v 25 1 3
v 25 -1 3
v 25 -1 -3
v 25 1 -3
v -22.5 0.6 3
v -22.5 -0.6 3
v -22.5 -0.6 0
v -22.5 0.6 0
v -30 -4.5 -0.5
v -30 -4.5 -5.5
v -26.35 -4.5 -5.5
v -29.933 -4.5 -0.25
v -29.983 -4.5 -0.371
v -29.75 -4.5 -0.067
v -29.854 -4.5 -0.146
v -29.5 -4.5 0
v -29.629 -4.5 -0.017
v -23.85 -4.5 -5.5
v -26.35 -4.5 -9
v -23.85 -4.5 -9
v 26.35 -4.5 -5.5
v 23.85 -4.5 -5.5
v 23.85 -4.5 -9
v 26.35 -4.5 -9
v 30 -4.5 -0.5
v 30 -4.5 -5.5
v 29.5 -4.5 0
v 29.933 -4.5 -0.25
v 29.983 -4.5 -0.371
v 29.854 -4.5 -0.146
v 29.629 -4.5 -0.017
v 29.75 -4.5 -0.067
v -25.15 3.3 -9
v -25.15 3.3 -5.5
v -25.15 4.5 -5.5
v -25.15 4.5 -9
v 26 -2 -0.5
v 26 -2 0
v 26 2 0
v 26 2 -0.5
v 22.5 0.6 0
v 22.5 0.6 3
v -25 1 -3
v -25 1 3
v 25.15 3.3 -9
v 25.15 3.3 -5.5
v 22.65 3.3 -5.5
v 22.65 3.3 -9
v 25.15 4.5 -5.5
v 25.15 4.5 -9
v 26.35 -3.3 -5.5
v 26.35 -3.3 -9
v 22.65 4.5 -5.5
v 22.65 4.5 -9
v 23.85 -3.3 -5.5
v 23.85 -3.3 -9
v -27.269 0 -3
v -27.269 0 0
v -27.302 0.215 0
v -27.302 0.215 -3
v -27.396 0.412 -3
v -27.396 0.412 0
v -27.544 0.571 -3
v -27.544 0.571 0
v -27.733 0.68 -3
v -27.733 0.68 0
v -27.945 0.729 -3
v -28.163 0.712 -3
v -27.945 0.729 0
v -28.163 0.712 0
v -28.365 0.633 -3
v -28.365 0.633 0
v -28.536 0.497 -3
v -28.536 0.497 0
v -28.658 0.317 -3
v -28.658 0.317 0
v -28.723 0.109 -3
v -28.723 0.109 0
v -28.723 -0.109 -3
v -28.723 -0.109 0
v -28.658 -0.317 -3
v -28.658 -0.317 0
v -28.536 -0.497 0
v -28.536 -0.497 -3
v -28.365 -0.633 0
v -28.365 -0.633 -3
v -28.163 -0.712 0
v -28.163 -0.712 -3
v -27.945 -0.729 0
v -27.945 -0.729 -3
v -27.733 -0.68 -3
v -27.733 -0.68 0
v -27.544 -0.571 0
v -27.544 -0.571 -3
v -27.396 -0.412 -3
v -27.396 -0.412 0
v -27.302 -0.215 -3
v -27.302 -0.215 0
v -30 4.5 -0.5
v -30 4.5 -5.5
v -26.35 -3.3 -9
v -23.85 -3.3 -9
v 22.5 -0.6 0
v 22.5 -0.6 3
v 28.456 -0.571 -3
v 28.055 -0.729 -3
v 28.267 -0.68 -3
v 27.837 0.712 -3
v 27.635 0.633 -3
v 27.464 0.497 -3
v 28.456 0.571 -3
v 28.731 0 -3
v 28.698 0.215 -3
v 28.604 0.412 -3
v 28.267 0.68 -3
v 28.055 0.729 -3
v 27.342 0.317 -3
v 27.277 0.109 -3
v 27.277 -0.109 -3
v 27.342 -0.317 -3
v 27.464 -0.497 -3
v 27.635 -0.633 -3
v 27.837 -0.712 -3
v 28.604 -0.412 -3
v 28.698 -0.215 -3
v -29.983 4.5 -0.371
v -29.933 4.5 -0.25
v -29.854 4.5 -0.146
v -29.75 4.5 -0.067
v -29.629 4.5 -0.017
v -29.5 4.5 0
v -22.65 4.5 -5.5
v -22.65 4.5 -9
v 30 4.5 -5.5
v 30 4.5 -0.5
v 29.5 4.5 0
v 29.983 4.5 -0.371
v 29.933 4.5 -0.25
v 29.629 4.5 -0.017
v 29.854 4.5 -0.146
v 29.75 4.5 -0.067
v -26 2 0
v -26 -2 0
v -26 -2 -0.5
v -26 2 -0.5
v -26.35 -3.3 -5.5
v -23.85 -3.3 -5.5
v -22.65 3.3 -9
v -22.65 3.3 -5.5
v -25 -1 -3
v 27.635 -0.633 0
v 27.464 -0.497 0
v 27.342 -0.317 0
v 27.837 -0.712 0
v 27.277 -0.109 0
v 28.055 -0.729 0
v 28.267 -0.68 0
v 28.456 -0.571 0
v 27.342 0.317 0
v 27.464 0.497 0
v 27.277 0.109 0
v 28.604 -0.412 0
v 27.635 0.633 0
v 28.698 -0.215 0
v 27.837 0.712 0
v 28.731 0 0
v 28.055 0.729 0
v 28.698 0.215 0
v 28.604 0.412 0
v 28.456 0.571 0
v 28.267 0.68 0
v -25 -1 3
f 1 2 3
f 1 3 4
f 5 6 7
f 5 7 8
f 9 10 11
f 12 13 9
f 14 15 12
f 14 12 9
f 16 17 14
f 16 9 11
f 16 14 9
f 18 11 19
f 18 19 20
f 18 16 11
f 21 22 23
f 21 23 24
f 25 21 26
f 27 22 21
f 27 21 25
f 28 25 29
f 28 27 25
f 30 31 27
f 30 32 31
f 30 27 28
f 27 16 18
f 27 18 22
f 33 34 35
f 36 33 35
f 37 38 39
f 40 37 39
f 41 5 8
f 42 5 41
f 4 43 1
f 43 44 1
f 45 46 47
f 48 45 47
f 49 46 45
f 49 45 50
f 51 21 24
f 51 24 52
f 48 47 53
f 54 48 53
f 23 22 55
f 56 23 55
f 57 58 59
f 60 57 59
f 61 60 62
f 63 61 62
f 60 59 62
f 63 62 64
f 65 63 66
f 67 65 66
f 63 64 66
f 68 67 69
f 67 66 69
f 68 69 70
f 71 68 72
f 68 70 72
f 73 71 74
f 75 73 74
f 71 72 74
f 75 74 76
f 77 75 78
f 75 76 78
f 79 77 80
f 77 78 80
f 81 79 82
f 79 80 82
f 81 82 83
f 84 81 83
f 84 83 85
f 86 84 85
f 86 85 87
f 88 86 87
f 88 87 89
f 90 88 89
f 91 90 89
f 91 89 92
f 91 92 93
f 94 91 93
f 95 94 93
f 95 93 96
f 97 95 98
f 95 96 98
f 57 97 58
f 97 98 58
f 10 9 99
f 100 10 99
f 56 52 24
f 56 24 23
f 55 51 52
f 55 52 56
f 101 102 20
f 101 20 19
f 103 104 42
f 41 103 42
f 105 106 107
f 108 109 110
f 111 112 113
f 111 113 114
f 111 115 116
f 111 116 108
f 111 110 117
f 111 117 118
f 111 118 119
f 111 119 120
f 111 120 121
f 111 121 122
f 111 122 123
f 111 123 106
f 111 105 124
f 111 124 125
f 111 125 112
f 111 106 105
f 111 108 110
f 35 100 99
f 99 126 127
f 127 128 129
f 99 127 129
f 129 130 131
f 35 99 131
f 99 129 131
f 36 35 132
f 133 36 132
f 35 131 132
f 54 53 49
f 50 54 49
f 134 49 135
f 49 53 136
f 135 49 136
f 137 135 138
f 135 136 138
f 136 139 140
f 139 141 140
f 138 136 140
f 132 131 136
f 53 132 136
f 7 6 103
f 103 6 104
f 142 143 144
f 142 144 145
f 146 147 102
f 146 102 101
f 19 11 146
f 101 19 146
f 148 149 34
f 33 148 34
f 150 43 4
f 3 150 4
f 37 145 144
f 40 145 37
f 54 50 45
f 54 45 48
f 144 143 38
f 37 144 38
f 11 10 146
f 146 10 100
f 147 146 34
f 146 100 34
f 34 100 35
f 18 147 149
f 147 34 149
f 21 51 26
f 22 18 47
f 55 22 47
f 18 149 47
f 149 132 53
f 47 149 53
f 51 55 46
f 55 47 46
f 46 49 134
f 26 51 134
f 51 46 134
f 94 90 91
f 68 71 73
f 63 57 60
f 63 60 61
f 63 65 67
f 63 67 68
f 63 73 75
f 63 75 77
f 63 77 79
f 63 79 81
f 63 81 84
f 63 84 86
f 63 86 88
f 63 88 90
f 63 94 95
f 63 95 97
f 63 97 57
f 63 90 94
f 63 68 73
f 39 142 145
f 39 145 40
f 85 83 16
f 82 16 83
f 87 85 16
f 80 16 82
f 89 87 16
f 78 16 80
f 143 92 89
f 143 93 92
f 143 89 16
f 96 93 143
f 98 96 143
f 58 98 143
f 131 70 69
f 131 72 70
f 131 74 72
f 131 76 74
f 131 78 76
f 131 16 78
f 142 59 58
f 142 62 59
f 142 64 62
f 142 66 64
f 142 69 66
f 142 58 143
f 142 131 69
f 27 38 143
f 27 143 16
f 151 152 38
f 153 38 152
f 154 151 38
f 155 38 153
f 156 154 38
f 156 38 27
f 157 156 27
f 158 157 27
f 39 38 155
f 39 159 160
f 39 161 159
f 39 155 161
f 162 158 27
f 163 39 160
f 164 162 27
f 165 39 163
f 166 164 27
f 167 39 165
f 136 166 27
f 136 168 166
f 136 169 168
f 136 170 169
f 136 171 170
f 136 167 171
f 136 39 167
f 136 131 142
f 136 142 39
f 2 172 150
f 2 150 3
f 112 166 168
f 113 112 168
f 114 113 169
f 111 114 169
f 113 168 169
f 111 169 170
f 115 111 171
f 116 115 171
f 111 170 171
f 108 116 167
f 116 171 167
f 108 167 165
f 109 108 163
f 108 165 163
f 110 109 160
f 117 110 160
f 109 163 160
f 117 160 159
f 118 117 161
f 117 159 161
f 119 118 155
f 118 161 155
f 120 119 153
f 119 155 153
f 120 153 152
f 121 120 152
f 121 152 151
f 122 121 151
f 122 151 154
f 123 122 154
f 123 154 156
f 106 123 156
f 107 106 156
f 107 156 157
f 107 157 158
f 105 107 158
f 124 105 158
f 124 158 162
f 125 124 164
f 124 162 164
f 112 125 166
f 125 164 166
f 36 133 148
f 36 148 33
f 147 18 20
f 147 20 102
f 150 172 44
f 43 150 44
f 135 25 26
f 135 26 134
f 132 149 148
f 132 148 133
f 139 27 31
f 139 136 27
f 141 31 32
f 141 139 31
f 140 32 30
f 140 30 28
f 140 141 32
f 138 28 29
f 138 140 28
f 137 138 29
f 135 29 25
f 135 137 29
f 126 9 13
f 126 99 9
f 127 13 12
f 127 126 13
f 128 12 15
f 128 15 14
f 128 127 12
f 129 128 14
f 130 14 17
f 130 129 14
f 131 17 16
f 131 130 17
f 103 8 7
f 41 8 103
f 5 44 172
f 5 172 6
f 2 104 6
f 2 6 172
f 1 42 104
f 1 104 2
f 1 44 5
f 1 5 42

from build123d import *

# Parameters (mm, degrees)
SKIZZE1_W                       = 60
SKIZZE1_H                       = 9
BODY_DEPTH                      = 5.5
SKIZZE4_R                       = 0.730693515
SCREW_HOLES_DEPTH               = 3
SKIZZE5_W                       = 52
SKIZZE5_H                       = 4
SCHNITT_LINEAR_AUSTRAGEN3_DEPTH = 0.5
VERRUNDUNG1_R                   = 0.5
PATHWAY_OF_GLIDER_W             = 50
PATHWAY_OF_GLIDER_H             = 2
PATHWAY_DEPTH                   = 3
SKIZZE7_W                       = 45
SKIZZE7_H                       = 1.2
F_45MM_DEPTH                    = 3
FLAP_W                          = 2.5
FLAP_H                          = 1.2
FLAPS_DEPTH                     = 3.5


with BuildPart() as part:
    # Skizze1 → body (new body)
    with BuildSketch(Plane.XY):
        Rectangle(SKIZZE1_W, SKIZZE1_H)
    extrude(amount=-BODY_DEPTH)

    # Skizze4 → screw holes (cut)
    with BuildSketch(Plane.XY):
        with Locations((-28, 0)):
            Circle(SKIZZE4_R)
        with Locations((28, 0)):
            Circle(SKIZZE4_R)
    extrude(amount=-SCREW_HOLES_DEPTH, mode=Mode.SUBTRACT)

    # Skizze5 → Schnitt-Linear austragen3 (cut)
    with BuildSketch(Plane.XY):
        Rectangle(SKIZZE5_W, SKIZZE5_H)
    extrude(amount=-SCHNITT_LINEAR_AUSTRAGEN3_DEPTH, mode=Mode.SUBTRACT)

    # Verrundung1
    verrundung1_edges = [part.edges().sort_by_distance(p)[0] for p in [
        (-30, 0, 0),
        (30, 0, 0),
    ]]
    fillet(verrundung1_edges, radius=VERRUNDUNG1_R)

    # flap → flaps (add)
    with BuildSketch(Plane(origin=(0, 0, -5.5), x_dir=(-1, 0, 0), z_dir=(0, 0, -1))):
        with Locations((-25.1, -3.9)):
            Rectangle(FLAP_W, FLAP_H)
        with Locations((25.1, -3.9)):
            Rectangle(FLAP_W, FLAP_H)
        with Locations((23.9, 3.9)):
            Rectangle(FLAP_W, FLAP_H)
        with Locations((-23.9, 3.9)):
            Rectangle(FLAP_W, FLAP_H)
    extrude(amount=FLAPS_DEPTH)


with BuildPart() as body_2:
    # pathway of glider → pathway (new body, symmetric)
    with BuildSketch(Plane.XY):
        Rectangle(PATHWAY_OF_GLIDER_W, PATHWAY_OF_GLIDER_H)
    extrude(amount=PATHWAY_DEPTH, both=True)

    # Skizze7 → 45mm (cut)
    with BuildSketch(Plane.XY.offset(3)):
        Rectangle(SKIZZE7_W, SKIZZE7_H)
    extrude(amount=-F_45MM_DEPTH, mode=Mode.SUBTRACT)


solid = Compound([part.part, body_2.part])
